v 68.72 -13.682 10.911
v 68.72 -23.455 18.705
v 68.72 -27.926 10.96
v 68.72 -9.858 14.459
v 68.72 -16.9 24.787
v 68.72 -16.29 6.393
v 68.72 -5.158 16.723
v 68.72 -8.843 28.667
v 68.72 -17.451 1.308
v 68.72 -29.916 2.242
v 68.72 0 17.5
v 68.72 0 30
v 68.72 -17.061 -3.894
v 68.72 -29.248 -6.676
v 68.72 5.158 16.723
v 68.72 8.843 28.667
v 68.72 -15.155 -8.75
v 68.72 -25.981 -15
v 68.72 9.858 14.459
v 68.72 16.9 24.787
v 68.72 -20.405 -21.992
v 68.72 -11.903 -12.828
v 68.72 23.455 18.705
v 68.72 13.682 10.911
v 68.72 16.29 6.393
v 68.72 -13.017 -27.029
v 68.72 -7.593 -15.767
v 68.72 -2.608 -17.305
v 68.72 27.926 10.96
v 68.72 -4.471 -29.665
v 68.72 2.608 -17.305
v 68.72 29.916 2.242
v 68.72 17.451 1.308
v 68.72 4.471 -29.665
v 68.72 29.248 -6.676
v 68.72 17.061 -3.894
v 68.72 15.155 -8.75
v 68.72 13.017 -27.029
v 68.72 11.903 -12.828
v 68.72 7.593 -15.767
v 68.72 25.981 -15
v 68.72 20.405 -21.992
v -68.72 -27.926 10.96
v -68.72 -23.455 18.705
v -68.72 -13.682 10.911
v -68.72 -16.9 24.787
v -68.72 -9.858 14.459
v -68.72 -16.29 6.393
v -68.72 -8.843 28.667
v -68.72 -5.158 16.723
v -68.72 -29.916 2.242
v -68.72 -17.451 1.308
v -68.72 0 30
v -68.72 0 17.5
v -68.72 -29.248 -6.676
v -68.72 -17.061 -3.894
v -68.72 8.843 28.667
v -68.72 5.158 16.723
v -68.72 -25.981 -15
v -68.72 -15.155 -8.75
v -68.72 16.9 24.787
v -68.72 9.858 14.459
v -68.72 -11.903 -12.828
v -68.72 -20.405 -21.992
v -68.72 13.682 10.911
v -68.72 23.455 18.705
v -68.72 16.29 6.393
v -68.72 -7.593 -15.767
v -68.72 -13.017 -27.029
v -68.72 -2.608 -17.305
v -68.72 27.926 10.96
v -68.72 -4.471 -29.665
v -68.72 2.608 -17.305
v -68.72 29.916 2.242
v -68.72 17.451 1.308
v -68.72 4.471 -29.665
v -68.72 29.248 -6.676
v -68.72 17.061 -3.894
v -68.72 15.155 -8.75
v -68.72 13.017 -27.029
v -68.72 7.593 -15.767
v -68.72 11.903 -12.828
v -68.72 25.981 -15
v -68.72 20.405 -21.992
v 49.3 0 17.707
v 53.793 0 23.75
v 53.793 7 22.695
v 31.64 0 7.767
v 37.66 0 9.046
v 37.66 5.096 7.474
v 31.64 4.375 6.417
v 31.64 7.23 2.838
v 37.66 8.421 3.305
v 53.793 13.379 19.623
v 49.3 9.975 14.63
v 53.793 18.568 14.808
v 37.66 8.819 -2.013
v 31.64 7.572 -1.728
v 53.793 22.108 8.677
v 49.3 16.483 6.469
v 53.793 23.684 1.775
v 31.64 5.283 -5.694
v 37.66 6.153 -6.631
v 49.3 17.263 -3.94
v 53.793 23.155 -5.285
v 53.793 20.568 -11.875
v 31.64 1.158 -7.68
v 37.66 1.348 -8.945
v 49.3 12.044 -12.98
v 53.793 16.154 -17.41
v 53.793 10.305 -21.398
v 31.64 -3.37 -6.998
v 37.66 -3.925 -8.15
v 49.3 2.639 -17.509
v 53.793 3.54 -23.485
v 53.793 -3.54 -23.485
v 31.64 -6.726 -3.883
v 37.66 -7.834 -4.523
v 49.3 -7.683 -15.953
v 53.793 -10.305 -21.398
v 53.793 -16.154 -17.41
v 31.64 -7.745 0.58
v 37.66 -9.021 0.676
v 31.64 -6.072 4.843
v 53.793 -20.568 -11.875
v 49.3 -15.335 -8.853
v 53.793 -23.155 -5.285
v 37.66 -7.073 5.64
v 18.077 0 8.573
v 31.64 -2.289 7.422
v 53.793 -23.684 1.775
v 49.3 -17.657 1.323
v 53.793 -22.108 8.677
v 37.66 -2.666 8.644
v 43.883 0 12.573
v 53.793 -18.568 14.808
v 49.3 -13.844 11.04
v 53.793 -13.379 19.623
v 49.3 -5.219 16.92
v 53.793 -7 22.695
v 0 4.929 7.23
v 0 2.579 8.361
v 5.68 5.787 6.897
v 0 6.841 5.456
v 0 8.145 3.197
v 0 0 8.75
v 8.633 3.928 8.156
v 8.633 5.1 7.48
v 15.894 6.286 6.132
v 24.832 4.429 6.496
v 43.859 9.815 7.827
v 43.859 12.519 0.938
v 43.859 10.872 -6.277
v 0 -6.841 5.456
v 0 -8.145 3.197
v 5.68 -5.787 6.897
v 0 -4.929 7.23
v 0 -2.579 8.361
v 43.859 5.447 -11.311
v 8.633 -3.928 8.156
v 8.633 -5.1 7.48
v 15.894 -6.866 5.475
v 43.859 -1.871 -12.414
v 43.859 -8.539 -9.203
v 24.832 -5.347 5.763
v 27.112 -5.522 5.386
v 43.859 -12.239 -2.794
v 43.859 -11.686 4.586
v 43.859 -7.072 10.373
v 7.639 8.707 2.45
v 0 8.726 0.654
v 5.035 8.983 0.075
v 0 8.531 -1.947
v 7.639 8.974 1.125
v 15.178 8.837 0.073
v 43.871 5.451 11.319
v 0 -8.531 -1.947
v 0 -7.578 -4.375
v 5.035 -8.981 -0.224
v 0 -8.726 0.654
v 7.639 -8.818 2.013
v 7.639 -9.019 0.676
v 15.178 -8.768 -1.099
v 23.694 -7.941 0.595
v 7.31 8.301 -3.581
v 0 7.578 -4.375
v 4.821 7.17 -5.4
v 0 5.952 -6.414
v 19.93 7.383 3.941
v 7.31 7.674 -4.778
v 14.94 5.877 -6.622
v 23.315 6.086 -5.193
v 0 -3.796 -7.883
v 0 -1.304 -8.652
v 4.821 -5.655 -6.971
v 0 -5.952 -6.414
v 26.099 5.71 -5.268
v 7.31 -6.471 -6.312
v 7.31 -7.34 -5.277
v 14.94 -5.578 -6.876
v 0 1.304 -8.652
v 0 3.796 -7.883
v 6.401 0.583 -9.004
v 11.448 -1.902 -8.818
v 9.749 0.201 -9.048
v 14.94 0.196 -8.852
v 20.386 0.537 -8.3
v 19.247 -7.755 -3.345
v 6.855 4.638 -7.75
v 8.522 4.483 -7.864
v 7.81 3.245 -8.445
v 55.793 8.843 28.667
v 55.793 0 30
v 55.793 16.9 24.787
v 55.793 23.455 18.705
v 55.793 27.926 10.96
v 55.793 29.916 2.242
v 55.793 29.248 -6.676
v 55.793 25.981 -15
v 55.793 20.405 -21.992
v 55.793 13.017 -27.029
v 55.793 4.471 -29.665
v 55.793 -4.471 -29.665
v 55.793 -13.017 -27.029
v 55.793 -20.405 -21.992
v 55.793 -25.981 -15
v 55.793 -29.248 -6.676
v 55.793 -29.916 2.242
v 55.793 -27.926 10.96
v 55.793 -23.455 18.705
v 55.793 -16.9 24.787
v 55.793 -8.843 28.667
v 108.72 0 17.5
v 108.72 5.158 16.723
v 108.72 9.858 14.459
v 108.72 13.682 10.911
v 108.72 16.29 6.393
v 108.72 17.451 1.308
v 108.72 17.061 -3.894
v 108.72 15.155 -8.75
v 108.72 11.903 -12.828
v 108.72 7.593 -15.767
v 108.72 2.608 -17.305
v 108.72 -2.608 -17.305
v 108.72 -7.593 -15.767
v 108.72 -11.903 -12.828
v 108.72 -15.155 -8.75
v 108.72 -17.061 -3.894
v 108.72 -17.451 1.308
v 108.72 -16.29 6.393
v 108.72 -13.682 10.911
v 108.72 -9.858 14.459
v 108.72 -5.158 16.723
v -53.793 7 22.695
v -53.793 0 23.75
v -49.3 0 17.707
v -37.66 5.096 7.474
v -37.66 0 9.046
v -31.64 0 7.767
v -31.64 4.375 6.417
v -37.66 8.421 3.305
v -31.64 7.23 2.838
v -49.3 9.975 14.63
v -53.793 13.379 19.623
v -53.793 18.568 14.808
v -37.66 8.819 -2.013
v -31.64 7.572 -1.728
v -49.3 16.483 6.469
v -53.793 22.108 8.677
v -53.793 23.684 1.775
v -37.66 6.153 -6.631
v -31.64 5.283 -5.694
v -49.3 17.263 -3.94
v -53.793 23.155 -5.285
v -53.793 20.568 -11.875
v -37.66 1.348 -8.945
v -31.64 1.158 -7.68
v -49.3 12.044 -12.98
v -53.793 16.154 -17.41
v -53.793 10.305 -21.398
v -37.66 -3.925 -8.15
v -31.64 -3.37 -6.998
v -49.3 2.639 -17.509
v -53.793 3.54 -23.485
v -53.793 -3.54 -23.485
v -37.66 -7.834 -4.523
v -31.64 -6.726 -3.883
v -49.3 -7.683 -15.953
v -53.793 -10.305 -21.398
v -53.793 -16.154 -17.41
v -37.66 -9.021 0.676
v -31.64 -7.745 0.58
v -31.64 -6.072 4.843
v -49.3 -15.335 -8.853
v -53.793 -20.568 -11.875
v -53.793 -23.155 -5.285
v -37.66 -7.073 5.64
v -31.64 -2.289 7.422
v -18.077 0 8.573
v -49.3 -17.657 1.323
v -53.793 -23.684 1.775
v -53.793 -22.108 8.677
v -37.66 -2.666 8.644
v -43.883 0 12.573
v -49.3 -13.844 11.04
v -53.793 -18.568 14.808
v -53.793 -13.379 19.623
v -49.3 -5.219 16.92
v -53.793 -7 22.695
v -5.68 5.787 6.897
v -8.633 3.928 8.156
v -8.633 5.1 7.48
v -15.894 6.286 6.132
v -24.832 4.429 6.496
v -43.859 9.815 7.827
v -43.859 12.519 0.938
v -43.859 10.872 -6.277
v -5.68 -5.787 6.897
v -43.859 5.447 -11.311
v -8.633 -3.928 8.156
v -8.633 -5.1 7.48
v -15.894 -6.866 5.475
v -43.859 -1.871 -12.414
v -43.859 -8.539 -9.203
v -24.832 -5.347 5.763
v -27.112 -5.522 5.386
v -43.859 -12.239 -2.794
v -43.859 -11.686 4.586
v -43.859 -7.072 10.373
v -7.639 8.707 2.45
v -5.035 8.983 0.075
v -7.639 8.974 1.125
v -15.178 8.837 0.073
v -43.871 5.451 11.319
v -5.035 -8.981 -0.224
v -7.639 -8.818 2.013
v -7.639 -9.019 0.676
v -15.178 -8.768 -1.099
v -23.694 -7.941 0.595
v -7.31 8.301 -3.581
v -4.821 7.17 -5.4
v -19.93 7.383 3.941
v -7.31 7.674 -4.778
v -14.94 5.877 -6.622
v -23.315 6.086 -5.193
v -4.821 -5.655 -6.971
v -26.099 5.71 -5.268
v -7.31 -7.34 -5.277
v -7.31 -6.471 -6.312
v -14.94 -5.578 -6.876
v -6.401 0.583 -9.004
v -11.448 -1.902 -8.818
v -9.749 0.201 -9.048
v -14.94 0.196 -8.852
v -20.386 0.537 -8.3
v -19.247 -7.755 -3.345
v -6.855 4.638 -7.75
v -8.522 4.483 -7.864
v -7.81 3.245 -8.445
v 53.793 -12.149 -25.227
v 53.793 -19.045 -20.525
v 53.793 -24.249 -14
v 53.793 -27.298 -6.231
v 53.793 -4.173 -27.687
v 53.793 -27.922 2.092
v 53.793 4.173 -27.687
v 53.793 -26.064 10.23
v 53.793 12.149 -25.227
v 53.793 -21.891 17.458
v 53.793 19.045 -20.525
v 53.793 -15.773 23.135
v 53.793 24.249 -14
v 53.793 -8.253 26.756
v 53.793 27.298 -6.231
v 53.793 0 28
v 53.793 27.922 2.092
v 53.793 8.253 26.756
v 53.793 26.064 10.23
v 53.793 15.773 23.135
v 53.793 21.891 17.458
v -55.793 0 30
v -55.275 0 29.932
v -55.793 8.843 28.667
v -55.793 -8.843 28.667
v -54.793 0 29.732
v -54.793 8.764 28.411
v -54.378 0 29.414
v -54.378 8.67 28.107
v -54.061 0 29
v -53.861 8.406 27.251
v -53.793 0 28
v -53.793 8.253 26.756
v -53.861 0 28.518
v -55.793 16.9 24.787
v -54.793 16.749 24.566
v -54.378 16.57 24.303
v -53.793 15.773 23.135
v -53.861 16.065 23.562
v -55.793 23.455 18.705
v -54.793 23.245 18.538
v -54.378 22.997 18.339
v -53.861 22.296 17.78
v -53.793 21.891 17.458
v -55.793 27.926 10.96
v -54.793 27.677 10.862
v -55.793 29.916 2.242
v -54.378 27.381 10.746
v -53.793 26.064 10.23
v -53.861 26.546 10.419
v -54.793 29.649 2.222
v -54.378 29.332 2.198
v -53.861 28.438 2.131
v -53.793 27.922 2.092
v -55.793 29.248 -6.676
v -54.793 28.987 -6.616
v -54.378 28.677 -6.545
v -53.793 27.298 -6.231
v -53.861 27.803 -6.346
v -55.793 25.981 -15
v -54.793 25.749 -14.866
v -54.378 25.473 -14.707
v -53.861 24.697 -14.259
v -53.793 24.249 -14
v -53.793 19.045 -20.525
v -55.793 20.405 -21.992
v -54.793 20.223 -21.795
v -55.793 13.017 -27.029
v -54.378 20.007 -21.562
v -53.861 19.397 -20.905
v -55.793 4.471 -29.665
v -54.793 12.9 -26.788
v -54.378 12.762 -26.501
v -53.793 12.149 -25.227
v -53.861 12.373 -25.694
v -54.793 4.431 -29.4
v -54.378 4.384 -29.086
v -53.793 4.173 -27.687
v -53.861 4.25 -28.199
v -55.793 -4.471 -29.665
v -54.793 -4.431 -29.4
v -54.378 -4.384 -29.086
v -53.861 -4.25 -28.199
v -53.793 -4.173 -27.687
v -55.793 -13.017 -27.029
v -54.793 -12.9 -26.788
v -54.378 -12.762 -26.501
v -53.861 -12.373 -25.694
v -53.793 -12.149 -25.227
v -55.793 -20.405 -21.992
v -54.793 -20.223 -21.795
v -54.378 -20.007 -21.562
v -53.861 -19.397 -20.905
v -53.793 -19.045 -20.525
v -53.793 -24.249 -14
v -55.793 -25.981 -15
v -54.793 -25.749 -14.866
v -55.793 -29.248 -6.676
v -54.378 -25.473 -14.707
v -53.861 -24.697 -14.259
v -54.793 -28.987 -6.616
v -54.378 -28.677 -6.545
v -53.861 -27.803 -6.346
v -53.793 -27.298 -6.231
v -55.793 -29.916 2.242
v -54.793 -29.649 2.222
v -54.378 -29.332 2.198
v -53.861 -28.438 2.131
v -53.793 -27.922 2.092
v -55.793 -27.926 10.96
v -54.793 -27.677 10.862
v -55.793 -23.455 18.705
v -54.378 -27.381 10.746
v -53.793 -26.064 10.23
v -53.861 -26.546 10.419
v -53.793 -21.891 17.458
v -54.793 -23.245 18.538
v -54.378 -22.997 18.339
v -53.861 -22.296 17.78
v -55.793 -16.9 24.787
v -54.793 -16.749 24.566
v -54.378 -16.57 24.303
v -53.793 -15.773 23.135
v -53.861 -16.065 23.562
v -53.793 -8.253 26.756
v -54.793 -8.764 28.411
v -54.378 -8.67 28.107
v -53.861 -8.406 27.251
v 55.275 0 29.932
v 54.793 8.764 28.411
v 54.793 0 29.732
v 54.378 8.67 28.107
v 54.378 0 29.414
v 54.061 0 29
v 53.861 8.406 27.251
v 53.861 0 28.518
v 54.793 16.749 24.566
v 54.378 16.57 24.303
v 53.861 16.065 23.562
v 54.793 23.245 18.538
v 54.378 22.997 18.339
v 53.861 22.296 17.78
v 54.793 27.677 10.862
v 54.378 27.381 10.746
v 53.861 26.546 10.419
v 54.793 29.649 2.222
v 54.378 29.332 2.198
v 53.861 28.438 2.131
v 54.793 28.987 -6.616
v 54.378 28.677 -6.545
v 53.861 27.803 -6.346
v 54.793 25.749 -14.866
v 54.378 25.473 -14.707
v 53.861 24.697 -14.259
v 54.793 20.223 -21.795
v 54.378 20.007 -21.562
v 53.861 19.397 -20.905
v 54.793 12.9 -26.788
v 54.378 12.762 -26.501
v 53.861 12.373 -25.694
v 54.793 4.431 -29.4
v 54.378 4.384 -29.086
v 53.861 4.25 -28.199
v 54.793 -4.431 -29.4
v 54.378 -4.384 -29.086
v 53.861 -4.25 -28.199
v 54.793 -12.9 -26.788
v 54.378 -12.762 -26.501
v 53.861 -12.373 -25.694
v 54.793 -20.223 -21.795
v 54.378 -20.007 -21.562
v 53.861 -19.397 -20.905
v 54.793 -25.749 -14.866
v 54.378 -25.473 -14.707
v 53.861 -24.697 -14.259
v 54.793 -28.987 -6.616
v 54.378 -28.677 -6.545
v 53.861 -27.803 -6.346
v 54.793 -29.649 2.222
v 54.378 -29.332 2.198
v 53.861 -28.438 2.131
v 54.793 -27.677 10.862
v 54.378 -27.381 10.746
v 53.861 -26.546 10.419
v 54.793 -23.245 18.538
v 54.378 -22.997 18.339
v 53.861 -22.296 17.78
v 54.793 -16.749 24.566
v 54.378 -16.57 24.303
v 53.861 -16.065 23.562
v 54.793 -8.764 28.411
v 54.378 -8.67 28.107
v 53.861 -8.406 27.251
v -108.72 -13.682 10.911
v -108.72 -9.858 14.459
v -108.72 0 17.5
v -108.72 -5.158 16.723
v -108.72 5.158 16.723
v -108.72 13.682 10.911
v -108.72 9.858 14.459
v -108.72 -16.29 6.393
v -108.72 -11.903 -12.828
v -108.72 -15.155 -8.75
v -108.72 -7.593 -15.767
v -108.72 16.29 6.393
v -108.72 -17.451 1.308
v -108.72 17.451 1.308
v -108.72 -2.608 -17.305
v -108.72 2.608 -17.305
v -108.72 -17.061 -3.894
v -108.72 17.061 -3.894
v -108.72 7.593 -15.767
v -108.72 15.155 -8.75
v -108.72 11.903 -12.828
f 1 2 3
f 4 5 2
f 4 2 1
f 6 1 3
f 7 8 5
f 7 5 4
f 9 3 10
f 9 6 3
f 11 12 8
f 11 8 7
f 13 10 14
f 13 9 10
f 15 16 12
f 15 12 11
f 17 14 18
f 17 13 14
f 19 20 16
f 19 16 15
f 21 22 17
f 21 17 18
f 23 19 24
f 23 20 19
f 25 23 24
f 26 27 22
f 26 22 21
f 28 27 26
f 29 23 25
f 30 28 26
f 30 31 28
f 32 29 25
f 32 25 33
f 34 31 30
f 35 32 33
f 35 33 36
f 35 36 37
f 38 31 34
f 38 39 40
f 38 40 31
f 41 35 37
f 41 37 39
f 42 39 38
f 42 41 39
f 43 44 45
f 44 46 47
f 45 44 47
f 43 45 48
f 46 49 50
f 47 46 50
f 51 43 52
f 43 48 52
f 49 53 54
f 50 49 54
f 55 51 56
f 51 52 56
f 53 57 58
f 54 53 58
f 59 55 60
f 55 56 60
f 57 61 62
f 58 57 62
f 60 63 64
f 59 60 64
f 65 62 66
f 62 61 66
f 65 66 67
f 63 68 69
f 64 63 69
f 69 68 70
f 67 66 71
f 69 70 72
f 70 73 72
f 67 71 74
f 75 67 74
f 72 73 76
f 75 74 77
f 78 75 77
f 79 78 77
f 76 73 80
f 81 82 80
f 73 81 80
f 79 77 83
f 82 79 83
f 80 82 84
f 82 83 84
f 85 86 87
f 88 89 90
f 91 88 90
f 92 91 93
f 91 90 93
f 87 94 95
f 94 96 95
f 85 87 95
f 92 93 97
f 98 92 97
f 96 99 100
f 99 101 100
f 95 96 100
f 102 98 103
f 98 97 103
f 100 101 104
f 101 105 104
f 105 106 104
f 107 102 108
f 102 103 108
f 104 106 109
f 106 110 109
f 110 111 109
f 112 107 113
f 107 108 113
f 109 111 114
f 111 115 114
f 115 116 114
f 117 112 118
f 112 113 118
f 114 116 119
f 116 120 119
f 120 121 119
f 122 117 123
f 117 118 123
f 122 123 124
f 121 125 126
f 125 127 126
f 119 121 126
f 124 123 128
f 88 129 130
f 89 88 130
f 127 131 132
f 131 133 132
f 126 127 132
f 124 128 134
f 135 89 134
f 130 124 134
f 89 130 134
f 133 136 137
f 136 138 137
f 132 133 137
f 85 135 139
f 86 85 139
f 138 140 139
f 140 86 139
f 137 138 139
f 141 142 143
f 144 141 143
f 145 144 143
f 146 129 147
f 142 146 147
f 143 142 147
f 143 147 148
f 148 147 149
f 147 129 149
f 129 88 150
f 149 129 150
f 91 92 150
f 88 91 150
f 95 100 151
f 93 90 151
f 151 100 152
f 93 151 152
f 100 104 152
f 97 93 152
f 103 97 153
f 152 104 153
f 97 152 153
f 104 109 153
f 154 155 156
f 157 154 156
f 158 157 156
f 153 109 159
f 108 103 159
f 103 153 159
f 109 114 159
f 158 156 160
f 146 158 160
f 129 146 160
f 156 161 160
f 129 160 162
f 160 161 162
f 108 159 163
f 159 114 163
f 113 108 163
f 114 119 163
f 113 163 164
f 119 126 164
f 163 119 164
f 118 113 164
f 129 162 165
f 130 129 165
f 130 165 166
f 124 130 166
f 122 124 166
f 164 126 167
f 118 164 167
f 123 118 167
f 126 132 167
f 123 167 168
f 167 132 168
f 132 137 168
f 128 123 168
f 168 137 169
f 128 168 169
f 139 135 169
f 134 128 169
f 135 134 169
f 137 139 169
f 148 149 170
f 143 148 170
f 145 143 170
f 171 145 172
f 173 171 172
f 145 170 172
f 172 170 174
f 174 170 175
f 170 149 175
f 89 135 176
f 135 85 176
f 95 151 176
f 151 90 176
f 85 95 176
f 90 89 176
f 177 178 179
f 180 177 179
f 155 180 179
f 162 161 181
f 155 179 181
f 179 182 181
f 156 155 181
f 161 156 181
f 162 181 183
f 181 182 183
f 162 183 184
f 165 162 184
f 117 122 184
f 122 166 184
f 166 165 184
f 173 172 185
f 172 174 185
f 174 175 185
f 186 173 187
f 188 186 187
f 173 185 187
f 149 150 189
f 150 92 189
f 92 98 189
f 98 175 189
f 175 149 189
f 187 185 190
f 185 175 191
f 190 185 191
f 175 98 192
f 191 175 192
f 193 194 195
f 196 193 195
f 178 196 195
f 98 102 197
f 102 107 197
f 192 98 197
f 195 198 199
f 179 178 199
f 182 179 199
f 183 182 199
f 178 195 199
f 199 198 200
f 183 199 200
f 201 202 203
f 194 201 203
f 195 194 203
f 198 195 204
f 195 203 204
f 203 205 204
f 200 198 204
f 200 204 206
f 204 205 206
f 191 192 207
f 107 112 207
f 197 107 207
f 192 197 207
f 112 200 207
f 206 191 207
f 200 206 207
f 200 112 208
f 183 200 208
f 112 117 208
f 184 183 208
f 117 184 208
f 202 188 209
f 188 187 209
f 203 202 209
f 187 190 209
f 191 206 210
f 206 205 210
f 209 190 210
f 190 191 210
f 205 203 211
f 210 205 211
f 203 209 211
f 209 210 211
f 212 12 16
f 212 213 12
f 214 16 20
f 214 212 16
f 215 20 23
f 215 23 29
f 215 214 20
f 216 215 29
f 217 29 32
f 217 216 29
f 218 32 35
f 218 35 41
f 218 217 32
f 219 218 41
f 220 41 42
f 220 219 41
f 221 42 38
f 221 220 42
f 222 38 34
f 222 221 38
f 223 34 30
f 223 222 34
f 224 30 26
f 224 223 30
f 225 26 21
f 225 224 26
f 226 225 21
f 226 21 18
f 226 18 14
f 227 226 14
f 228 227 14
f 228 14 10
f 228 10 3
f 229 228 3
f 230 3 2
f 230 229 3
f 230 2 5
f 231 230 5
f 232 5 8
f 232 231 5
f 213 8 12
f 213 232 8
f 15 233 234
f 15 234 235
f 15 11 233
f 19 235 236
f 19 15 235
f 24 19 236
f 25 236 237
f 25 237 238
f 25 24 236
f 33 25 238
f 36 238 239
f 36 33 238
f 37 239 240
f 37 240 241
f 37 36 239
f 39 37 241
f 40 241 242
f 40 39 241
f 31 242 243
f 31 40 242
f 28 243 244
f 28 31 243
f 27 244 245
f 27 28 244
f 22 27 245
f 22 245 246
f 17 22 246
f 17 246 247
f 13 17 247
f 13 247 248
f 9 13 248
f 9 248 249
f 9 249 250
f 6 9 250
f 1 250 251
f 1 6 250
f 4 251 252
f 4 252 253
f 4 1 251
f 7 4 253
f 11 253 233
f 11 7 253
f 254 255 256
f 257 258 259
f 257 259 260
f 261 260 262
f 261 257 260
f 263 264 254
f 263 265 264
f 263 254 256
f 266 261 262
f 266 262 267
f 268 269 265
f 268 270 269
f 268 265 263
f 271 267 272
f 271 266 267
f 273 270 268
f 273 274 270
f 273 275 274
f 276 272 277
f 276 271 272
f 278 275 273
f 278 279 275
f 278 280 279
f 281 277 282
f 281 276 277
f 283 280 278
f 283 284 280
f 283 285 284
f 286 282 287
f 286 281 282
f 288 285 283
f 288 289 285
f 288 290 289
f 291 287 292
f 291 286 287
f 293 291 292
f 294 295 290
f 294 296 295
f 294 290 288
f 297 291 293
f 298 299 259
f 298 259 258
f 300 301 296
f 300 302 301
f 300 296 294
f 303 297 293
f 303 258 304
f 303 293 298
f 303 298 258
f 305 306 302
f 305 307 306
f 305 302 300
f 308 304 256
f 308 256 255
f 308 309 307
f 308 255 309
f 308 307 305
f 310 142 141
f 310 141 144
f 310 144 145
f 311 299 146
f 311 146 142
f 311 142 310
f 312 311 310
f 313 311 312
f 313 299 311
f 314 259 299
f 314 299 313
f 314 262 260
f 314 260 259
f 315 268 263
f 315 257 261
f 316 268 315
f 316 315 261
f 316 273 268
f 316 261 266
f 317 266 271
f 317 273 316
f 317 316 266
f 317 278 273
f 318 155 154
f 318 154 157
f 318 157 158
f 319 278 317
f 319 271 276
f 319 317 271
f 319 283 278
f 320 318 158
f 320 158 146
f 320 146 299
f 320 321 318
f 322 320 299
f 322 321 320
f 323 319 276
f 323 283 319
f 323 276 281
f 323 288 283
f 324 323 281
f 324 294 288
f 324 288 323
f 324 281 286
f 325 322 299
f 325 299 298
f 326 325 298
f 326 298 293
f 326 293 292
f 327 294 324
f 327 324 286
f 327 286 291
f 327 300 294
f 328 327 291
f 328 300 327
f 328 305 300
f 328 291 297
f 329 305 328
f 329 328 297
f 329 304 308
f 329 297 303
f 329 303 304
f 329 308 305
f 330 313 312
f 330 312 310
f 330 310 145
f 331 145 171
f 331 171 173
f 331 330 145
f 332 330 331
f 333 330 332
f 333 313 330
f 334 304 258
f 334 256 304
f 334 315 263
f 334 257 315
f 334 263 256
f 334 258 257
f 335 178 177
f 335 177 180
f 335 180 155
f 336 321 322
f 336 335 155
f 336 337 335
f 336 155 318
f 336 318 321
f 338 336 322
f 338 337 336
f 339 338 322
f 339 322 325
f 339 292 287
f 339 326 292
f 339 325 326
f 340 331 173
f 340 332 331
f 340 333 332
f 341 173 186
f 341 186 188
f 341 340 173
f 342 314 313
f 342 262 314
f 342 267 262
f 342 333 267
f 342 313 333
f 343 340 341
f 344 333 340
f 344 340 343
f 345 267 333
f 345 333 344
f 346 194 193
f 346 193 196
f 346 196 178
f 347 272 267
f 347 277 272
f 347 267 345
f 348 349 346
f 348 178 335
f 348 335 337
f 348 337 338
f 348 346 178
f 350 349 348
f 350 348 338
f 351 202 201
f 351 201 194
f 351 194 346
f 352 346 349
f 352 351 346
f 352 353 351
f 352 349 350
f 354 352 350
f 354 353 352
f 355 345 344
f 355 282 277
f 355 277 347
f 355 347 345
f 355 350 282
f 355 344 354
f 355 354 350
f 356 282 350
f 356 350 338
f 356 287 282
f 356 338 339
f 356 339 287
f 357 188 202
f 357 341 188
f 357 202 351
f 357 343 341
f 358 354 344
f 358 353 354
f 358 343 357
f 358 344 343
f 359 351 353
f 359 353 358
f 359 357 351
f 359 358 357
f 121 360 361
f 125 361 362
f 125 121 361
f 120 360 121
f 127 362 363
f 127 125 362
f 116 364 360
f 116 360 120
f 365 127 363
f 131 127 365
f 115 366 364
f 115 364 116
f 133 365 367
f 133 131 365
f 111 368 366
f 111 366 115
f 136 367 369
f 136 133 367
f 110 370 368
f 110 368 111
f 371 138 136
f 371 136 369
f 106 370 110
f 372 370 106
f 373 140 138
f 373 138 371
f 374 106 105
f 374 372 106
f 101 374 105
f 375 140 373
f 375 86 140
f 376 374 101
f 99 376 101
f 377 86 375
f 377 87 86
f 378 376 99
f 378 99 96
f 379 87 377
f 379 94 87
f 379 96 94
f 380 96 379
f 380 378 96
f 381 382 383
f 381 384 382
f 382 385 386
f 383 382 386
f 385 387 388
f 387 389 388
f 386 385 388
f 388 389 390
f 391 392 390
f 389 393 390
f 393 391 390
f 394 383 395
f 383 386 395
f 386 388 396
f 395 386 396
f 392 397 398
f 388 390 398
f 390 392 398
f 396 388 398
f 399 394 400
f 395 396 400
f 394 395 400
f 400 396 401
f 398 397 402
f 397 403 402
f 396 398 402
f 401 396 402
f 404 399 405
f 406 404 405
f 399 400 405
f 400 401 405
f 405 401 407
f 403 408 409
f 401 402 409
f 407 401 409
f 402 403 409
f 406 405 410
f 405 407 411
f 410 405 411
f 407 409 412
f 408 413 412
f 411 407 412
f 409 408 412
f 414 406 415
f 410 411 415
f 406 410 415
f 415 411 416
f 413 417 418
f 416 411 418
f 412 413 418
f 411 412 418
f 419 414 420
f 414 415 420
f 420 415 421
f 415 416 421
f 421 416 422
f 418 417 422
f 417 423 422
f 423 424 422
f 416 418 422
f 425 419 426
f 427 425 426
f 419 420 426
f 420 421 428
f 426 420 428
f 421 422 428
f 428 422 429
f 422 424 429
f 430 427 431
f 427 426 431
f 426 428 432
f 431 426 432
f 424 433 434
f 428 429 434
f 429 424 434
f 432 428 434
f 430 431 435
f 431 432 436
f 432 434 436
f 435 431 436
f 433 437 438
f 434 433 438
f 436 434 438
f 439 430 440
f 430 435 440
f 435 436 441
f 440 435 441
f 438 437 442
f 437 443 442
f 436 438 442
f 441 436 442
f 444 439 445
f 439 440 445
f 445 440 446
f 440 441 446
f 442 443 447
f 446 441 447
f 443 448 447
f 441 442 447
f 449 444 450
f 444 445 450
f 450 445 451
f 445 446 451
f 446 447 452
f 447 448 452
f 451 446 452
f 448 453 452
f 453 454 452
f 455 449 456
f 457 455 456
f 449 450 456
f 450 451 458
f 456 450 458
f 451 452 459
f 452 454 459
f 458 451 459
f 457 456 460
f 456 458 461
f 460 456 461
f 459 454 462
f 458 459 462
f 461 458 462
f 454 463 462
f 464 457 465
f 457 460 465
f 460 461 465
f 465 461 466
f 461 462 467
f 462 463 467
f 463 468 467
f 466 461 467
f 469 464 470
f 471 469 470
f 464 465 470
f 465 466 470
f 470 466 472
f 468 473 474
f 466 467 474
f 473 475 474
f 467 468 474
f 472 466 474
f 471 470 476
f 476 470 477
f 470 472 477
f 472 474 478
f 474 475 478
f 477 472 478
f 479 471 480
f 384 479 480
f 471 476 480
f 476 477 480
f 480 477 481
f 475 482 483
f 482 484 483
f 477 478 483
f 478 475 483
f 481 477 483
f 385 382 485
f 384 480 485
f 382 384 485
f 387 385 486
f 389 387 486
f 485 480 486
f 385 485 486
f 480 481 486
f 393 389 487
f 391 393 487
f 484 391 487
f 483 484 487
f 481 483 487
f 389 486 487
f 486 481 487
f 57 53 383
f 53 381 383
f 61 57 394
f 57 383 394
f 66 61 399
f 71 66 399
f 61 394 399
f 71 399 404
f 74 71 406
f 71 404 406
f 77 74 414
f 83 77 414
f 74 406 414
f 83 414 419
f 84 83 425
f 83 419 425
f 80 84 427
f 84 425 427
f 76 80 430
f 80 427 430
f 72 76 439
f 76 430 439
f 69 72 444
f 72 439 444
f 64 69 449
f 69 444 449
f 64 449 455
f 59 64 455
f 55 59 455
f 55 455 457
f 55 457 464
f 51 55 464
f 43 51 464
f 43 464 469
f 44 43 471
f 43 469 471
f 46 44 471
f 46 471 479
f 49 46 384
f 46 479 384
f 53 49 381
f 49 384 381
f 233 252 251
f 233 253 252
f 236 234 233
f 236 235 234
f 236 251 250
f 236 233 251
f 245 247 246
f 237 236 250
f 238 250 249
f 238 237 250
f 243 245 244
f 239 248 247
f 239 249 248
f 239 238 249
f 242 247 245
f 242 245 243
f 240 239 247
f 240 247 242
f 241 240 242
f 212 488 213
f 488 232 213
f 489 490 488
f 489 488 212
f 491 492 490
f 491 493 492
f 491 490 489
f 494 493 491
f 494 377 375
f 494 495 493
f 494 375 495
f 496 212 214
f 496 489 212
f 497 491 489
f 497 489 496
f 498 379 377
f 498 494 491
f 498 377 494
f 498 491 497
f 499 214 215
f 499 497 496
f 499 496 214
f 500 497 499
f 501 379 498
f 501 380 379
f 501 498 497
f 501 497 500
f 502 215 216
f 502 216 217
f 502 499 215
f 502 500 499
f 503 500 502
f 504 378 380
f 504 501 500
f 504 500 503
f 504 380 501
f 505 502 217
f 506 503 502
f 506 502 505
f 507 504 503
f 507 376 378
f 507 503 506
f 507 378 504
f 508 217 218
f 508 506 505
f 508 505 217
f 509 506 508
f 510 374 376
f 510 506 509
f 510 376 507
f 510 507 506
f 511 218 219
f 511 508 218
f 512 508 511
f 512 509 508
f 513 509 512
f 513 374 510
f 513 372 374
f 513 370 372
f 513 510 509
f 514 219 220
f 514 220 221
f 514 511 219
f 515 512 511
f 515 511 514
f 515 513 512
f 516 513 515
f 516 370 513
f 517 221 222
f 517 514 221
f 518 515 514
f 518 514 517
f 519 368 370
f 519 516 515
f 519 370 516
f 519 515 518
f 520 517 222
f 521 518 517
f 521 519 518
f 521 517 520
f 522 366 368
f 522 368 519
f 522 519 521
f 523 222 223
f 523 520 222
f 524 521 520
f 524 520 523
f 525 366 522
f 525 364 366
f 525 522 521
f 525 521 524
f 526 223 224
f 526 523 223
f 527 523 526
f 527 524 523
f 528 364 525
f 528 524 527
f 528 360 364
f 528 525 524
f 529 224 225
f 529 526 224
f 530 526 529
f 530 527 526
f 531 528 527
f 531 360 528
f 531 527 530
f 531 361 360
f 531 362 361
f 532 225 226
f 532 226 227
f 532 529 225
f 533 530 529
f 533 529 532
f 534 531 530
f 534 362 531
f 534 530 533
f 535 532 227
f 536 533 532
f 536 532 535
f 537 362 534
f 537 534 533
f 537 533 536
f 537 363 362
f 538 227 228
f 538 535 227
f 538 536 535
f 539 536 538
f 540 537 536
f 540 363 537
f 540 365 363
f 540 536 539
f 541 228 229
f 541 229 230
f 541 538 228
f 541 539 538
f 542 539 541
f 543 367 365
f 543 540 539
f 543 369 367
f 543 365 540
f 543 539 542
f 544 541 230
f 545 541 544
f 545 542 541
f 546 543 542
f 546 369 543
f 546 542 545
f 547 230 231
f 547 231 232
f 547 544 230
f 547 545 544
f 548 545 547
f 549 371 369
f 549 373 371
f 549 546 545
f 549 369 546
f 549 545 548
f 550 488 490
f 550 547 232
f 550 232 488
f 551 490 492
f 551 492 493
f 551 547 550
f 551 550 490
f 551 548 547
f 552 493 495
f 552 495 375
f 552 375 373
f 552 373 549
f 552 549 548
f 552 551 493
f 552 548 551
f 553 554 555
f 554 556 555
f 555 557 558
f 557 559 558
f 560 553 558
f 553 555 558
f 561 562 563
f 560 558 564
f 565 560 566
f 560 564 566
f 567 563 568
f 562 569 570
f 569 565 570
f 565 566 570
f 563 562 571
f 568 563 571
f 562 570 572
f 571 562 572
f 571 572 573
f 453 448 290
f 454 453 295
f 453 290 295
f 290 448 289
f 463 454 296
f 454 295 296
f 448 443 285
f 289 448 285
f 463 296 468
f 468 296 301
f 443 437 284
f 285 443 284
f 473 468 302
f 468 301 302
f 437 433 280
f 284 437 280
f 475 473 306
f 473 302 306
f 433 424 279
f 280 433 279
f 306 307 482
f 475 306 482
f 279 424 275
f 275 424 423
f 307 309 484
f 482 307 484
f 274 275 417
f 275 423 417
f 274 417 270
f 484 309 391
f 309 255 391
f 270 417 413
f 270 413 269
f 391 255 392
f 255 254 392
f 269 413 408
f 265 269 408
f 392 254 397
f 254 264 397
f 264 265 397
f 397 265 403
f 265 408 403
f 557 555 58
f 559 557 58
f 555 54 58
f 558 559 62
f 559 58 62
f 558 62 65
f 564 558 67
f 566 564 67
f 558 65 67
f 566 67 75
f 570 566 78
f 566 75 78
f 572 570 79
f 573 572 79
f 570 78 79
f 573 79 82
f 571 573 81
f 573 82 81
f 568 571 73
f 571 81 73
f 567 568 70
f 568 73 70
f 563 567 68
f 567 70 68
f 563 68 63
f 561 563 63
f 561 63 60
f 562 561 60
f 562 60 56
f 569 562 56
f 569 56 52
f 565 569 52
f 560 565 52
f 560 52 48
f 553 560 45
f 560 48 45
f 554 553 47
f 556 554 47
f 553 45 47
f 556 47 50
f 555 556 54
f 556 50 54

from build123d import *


with BuildPart() as f1:
    # F0 (on Front) → F1 (revolve)
    with BuildSketch(Plane.XZ):
        with BuildLine():
            Line((0, 8.75), (0, 0))
            Line((0, 0), (108.719505762, 0))
            Line((108.719505762, 0), (108.719505762, 17.5))
            Line((108.719505762, 17.5), (68.719505762, 17.5))
            Line((68.719505762, 17.5), (68.719505762, 30))
            Line((68.719505762, 30), (55.7926830174, 30))
            ThreePointArc((55.7926830174, 30), (54.3784694551, 29.4142135624), (53.7926830174, 28))
            Line((53.7926830174, 28), (53.7926830174, 23.75))
            add(Edge.make_bspline(
                [(0, 8.75), (5.0406153604, 9.0258980354), (16.3424850669, 9.5343195461), (38.0075656916, 5.0292358393), (49.6364947054, 17.2036020787), (53.7926830174, 23.75)],
                knots=[0, 0, 0, 0, 0.3026453885, 0.6427893554, 1, 1, 1, 1], degree=3))
        make_face()
    revolve(axis=Axis((54.359752881, 0, 0), (-1, 0, 0)))

    # F2: F1 across face


with BuildPart() as f1_1:
    add(f1.part)
    add(f1.part.mirror(Plane(origin=(0, 0, 0), x_dir=(0, -1, 0), z_dir=(-1, 0, 0))))


solid = f1_1.part
